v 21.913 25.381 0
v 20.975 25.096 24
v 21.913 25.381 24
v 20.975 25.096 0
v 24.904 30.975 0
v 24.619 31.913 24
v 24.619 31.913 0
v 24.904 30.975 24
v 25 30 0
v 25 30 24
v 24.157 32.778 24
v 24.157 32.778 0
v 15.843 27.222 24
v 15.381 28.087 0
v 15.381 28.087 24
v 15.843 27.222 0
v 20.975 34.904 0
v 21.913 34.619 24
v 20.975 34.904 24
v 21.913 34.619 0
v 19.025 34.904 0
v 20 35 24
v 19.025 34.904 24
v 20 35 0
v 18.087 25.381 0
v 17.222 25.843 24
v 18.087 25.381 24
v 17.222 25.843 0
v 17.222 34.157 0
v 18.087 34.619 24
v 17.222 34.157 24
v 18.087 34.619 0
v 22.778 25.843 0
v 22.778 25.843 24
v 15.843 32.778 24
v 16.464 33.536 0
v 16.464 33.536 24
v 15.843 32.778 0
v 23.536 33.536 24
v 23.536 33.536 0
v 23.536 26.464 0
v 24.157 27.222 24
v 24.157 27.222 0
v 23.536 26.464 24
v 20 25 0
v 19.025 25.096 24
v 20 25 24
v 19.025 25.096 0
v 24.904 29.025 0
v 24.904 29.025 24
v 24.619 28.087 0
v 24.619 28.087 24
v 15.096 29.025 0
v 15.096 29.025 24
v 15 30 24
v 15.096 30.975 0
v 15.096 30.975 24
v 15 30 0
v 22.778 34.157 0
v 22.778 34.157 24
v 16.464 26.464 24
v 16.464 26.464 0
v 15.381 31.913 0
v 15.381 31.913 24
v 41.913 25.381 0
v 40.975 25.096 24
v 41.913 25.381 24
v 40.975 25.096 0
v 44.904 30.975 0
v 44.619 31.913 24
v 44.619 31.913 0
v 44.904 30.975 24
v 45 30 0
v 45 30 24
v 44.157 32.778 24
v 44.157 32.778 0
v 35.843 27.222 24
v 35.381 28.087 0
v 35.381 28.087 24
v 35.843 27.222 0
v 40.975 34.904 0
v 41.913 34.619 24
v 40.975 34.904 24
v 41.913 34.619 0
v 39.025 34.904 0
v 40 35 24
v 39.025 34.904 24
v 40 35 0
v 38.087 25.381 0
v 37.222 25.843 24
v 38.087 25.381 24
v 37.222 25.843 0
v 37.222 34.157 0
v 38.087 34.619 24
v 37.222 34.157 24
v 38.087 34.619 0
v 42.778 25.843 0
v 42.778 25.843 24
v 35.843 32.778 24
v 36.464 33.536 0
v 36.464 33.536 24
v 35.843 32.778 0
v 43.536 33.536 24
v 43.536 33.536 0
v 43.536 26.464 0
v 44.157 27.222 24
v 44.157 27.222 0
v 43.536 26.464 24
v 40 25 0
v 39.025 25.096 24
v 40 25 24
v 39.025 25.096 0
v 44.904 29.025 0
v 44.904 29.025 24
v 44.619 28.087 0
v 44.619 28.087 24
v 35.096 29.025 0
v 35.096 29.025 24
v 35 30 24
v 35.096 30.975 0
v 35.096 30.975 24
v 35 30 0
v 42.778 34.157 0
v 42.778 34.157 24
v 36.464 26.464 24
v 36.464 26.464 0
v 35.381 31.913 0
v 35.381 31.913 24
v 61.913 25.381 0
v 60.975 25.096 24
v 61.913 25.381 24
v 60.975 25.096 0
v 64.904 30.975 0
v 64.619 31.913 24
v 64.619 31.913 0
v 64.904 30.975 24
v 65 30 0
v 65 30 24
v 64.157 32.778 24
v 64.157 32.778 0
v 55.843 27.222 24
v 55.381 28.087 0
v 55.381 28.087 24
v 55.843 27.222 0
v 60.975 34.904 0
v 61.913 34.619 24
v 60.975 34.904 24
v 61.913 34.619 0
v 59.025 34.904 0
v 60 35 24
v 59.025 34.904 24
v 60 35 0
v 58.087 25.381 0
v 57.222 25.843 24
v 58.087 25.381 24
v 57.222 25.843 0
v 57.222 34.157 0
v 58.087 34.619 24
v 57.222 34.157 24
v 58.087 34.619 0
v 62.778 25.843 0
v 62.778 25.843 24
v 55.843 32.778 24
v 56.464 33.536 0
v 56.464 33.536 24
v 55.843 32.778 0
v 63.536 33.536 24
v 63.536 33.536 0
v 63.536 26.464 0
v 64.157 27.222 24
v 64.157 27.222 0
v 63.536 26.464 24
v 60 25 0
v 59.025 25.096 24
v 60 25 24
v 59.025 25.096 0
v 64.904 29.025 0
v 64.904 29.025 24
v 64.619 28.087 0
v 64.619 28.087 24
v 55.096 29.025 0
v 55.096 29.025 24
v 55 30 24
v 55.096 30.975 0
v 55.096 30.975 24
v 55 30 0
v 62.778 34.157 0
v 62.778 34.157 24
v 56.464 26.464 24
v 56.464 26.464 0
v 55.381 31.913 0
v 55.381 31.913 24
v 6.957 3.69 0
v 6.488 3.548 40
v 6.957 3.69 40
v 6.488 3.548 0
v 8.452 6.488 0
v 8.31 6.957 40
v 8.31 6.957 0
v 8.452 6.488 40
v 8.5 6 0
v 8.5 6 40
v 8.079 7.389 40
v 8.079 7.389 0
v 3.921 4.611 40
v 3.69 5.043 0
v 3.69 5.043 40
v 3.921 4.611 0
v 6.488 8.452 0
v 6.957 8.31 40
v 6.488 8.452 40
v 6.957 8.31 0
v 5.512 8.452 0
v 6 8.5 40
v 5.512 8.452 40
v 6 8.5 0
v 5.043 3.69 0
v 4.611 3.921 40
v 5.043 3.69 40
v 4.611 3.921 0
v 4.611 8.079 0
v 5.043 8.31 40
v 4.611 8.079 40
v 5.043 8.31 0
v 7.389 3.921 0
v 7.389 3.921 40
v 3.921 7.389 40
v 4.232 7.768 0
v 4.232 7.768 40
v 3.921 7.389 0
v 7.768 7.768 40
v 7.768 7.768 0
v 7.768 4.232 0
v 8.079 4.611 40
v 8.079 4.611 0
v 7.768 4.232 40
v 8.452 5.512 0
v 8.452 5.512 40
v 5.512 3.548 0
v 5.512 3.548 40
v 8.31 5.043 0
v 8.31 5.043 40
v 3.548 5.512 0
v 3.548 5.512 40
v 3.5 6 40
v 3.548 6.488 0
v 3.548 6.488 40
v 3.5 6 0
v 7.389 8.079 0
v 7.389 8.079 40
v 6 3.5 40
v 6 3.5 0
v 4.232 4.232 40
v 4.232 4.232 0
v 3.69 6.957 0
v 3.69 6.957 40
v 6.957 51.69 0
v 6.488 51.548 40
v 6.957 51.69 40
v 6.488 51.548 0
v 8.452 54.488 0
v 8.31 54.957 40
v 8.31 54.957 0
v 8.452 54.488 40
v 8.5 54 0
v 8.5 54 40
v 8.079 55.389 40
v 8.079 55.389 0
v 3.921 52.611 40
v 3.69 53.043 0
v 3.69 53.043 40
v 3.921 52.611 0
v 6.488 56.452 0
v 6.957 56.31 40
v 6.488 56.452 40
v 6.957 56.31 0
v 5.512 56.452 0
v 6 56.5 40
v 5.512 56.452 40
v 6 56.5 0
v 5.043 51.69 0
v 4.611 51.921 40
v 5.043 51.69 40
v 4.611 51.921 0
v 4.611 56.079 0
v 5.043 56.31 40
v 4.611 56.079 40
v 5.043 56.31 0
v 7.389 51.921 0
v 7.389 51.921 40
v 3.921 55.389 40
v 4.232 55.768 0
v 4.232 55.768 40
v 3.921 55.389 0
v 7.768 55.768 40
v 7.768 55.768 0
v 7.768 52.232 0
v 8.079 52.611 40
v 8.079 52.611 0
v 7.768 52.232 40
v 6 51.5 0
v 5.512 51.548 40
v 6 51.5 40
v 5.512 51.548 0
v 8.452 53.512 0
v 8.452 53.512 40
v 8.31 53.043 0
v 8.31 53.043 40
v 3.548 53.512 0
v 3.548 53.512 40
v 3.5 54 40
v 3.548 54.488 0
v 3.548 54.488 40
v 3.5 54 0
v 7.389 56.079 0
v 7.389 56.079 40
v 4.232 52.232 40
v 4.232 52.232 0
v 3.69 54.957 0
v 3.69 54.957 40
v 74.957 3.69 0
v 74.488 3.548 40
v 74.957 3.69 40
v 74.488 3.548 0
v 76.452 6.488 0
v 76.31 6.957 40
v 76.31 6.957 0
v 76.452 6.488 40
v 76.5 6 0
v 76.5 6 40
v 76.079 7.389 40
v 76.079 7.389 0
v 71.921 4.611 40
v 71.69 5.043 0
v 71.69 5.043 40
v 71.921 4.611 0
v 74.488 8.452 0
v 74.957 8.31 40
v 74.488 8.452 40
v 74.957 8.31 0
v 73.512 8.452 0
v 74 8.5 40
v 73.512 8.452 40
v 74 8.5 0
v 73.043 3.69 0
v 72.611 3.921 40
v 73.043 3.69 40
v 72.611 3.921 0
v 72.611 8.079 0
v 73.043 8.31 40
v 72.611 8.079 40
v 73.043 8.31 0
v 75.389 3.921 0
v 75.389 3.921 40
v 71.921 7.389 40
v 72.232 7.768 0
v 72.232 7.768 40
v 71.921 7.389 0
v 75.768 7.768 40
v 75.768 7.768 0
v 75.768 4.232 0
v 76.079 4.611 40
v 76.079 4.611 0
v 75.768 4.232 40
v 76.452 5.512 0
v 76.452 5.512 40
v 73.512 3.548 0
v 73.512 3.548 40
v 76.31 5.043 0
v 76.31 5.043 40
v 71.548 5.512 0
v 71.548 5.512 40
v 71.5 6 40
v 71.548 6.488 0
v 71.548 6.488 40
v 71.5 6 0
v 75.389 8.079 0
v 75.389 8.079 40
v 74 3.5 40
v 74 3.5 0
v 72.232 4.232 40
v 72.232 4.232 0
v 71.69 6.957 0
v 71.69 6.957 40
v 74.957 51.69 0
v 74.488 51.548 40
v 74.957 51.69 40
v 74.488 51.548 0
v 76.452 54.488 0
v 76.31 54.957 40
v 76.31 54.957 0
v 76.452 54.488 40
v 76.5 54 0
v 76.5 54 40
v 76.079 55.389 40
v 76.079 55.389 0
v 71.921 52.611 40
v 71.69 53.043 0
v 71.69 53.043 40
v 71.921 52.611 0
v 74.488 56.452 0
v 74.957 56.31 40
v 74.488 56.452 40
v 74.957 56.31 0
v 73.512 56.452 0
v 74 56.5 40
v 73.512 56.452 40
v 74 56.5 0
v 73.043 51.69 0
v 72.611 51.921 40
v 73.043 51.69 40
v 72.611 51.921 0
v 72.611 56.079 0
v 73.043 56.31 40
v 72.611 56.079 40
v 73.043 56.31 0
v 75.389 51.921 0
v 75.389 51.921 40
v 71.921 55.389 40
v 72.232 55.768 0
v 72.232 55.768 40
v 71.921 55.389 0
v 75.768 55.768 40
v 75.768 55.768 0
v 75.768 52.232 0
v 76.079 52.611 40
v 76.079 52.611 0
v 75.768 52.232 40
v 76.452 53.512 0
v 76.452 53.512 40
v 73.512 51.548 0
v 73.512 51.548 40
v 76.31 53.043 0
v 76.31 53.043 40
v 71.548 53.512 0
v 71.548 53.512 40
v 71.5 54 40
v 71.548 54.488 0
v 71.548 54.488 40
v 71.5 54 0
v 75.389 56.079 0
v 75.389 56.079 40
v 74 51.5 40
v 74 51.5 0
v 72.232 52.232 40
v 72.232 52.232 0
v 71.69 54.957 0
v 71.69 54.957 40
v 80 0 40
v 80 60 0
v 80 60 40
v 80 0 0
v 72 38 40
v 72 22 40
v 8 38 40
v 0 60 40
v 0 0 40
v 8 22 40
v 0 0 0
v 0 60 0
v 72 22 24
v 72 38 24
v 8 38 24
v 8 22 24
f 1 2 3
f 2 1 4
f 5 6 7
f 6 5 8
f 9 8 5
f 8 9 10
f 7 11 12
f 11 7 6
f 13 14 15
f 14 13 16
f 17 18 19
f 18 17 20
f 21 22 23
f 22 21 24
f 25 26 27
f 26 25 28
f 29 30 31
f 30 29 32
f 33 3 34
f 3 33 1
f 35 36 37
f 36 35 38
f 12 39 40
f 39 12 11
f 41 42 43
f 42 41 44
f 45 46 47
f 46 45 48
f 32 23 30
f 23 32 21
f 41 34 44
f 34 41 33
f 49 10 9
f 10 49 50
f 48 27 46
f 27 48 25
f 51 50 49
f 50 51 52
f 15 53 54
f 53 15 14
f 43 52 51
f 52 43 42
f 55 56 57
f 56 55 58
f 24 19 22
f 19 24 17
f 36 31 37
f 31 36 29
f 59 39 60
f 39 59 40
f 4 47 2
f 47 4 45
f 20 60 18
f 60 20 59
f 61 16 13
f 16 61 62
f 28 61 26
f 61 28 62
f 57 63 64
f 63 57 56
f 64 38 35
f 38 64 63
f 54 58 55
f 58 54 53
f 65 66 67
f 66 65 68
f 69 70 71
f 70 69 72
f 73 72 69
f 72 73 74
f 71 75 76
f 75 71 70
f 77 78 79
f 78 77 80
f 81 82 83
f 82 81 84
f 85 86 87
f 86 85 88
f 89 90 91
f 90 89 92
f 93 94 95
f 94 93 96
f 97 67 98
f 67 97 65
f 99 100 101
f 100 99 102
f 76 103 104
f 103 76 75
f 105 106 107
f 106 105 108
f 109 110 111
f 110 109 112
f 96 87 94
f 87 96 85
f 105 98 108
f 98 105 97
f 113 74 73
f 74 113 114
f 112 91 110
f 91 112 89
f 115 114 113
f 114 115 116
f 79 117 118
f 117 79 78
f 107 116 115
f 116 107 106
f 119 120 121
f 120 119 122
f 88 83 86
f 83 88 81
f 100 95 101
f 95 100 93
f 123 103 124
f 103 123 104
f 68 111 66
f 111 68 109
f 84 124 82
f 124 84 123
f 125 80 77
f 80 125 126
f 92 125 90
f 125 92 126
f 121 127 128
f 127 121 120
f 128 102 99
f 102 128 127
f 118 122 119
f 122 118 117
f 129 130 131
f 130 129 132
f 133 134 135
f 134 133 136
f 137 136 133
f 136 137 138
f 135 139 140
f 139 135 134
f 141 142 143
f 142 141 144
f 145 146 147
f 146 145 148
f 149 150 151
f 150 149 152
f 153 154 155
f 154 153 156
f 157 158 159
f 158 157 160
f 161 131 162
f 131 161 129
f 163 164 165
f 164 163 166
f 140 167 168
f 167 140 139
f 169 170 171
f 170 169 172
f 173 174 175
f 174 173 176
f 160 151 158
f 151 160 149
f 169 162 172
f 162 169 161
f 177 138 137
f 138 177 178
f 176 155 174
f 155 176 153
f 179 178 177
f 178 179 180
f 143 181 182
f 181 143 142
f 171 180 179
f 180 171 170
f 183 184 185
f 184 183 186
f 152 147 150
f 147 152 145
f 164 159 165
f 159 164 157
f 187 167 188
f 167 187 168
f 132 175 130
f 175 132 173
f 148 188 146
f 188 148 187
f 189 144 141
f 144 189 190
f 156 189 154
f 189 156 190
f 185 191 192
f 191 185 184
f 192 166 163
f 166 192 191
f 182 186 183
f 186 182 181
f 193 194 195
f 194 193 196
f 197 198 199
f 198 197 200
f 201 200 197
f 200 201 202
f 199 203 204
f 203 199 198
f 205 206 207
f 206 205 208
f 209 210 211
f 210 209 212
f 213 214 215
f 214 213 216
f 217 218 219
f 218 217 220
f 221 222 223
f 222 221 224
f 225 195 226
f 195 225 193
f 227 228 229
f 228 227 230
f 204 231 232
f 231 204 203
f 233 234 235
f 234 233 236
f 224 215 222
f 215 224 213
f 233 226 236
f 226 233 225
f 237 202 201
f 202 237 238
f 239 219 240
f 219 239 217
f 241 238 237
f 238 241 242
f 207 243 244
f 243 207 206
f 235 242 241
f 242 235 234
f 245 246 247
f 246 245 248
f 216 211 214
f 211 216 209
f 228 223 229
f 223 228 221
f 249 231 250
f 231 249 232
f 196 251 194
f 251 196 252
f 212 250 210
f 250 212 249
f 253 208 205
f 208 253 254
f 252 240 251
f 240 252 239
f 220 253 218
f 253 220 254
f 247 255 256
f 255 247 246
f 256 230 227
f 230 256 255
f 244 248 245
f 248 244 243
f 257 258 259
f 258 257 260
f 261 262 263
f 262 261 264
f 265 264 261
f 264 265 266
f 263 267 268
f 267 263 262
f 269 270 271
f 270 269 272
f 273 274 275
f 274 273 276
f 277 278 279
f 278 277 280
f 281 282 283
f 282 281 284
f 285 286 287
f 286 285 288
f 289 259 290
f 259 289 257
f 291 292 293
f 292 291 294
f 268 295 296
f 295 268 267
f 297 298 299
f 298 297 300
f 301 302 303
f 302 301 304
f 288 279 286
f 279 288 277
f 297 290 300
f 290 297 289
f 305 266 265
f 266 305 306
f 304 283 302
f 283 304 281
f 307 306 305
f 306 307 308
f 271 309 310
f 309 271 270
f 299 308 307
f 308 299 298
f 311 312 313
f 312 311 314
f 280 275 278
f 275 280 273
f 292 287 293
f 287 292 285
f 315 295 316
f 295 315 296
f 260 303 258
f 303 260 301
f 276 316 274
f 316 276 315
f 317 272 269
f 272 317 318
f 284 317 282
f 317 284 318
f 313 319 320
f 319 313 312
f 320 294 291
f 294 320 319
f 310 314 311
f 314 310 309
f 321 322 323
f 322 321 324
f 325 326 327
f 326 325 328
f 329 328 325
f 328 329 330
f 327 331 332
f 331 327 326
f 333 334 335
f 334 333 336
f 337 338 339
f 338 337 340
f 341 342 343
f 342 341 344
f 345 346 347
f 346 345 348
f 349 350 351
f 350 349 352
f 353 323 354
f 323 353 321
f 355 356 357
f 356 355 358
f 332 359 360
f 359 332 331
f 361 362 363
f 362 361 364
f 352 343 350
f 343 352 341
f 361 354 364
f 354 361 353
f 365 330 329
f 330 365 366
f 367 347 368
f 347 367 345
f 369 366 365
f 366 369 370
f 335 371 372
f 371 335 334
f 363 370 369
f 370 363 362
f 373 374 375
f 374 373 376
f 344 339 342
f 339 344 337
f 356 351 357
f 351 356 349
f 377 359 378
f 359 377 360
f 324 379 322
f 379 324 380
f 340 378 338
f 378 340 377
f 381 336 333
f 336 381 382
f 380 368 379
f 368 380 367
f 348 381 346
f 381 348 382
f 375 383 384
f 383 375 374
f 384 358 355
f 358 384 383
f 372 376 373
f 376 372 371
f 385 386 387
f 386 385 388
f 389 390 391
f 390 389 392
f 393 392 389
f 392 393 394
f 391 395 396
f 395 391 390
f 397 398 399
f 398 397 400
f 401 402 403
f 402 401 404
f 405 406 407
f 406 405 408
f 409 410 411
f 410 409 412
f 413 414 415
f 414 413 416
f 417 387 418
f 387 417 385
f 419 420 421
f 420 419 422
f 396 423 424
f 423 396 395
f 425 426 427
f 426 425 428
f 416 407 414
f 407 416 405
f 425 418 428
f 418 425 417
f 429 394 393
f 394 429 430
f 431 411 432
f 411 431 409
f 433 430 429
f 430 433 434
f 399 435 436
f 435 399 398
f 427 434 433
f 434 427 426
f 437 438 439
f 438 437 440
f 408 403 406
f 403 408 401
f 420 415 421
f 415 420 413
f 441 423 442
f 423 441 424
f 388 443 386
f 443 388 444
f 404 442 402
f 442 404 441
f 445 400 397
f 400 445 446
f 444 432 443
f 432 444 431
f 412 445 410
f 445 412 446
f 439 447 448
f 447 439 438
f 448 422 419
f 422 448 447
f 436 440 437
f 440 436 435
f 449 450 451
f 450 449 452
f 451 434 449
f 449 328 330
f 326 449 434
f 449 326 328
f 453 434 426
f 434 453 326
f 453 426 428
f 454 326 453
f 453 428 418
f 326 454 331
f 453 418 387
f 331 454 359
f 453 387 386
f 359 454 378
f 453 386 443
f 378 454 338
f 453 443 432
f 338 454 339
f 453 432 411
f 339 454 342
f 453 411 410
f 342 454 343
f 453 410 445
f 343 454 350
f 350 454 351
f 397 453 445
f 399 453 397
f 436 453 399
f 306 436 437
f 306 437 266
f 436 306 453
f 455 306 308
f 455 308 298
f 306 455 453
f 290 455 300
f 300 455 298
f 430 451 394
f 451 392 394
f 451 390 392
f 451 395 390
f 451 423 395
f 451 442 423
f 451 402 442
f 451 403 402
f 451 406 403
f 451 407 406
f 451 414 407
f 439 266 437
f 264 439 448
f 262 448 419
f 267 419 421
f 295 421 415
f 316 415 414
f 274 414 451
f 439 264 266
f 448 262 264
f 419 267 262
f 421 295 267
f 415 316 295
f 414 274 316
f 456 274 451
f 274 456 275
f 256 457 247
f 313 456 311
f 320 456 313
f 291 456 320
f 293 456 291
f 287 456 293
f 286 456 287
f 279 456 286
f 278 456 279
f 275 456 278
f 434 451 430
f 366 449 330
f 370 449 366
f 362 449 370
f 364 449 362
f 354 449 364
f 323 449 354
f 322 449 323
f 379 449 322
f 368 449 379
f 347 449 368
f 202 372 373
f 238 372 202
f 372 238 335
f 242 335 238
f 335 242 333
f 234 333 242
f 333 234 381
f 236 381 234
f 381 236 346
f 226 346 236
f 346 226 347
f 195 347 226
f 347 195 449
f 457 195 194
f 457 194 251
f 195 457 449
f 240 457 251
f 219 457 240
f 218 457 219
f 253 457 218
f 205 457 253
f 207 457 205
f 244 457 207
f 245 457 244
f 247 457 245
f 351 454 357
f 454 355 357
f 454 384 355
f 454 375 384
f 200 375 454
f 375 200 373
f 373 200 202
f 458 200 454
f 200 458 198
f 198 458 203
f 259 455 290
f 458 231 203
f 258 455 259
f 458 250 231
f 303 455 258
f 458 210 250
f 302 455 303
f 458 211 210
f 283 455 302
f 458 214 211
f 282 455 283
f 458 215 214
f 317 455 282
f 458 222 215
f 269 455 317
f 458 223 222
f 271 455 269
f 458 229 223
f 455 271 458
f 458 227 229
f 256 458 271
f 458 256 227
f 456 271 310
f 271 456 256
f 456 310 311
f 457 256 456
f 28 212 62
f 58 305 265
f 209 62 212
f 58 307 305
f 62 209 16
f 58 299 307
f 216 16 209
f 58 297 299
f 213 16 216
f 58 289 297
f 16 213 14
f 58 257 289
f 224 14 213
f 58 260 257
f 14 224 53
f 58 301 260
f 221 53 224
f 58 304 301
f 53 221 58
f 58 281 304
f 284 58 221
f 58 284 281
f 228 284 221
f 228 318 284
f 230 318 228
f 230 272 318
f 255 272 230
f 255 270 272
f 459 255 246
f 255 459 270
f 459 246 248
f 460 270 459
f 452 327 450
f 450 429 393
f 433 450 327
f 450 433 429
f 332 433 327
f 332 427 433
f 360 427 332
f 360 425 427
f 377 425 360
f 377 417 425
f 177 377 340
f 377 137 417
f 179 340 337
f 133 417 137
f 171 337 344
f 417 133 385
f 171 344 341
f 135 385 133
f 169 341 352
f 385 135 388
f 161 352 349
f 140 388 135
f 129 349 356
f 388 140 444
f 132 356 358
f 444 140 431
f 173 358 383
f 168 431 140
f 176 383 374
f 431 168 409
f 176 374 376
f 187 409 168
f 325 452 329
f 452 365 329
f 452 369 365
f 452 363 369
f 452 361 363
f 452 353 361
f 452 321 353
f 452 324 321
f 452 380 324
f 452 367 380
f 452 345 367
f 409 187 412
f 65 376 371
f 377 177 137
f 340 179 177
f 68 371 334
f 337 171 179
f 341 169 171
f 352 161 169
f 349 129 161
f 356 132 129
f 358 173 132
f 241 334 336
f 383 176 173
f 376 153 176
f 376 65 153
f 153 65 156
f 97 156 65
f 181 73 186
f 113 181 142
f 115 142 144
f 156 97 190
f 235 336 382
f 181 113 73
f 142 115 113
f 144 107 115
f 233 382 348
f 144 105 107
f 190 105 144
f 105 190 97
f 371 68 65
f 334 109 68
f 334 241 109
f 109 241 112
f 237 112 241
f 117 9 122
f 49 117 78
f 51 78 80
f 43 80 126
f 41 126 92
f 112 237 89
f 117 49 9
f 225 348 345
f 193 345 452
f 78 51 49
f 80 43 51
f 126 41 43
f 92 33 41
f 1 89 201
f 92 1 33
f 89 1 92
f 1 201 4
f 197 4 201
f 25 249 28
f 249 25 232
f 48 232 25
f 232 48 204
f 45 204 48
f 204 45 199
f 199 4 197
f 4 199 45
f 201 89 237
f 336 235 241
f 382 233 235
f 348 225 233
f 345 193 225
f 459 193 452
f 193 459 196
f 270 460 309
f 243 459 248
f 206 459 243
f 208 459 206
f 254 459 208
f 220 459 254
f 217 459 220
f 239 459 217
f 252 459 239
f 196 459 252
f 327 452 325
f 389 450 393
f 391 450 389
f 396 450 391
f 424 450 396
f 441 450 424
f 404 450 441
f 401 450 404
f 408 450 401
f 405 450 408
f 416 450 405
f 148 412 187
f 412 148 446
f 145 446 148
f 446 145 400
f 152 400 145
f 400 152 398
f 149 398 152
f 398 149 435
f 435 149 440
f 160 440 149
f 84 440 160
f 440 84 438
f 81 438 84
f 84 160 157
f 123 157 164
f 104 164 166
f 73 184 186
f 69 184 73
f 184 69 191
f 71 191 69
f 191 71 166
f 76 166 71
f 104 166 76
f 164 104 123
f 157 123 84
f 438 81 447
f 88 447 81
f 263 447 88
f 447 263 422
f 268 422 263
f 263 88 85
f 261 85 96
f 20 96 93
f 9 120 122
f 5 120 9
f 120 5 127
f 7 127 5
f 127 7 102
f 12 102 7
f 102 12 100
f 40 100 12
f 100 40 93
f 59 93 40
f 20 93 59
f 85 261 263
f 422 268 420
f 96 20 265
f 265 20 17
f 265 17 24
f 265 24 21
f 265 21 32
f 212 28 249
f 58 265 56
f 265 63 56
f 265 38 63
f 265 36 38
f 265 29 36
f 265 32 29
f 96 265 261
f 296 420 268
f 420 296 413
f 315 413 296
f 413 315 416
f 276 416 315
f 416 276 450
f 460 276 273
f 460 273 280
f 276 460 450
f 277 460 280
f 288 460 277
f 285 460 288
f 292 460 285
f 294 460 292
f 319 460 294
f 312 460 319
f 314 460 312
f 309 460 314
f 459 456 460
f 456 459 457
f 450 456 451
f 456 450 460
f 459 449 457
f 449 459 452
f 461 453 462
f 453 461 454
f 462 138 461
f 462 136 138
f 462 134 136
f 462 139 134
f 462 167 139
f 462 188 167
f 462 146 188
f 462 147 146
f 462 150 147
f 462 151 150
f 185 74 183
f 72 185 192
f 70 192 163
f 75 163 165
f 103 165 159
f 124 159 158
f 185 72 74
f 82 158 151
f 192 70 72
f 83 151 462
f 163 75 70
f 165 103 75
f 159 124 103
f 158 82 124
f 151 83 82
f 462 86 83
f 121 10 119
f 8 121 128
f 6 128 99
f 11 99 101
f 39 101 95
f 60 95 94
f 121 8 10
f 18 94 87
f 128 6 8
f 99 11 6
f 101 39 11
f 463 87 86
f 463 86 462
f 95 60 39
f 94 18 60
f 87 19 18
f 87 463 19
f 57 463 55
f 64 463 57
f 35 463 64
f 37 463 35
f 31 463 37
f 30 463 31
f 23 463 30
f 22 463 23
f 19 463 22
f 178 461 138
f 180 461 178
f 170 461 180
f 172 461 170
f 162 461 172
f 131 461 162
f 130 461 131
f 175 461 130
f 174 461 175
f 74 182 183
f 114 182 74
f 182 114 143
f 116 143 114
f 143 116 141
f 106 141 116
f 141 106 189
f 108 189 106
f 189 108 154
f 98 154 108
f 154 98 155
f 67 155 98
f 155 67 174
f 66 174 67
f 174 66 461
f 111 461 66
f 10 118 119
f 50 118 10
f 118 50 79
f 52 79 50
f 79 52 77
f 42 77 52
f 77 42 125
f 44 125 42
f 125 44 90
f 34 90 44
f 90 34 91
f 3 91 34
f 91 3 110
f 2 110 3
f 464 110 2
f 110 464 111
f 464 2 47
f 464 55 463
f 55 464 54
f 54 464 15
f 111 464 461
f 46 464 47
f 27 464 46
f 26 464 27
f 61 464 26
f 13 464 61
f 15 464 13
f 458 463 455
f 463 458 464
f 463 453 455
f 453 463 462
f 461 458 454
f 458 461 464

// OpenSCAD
$fn = 32;

// ----------------------------------------------------------------------
// Manifold block: gallery_top manifold
// ----------------------------------------------------------------------

// --- parameters (mm) ---
block_l = 80;             // block length, X
block_w = 60;             // block width, Y
block_h = 40;             // block height, Z
port_d = 10;              // port bore diameter
port_pitch = 20;          // port pitch along X
gallery_d = 16;           // top gallery width, Y
gallery_depth = 16;       // gallery pocket depth
wall_p = 8;               // gallery end wall thickness, X
mnt_d = 5;                // mounting hole diameter
mnt_in = 6;               // mounting hole inset from the edges

n_ports = 3;  // ports in the row
port_x0 = (block_l - (n_ports - 1) * port_pitch) / 2;  // first port X

difference() {
  cube([block_l, block_w, block_h]);
  for (i = [0 : n_ports - 1])
    translate([port_x0 + i * port_pitch, block_w / 2, -1])
      cylinder(h = block_h + 2, d = port_d);
  translate([wall_p, block_w / 2 - gallery_d / 2, block_h - gallery_depth])
    cube([block_l - 2 * wall_p, gallery_d, gallery_depth + 1]);
  for (cx = [mnt_in, block_l - mnt_in])
    for (cy = [mnt_in, block_w - mnt_in])
      translate([cx, cy, -1]) cylinder(h = block_h + 2, d = mnt_d);
}
